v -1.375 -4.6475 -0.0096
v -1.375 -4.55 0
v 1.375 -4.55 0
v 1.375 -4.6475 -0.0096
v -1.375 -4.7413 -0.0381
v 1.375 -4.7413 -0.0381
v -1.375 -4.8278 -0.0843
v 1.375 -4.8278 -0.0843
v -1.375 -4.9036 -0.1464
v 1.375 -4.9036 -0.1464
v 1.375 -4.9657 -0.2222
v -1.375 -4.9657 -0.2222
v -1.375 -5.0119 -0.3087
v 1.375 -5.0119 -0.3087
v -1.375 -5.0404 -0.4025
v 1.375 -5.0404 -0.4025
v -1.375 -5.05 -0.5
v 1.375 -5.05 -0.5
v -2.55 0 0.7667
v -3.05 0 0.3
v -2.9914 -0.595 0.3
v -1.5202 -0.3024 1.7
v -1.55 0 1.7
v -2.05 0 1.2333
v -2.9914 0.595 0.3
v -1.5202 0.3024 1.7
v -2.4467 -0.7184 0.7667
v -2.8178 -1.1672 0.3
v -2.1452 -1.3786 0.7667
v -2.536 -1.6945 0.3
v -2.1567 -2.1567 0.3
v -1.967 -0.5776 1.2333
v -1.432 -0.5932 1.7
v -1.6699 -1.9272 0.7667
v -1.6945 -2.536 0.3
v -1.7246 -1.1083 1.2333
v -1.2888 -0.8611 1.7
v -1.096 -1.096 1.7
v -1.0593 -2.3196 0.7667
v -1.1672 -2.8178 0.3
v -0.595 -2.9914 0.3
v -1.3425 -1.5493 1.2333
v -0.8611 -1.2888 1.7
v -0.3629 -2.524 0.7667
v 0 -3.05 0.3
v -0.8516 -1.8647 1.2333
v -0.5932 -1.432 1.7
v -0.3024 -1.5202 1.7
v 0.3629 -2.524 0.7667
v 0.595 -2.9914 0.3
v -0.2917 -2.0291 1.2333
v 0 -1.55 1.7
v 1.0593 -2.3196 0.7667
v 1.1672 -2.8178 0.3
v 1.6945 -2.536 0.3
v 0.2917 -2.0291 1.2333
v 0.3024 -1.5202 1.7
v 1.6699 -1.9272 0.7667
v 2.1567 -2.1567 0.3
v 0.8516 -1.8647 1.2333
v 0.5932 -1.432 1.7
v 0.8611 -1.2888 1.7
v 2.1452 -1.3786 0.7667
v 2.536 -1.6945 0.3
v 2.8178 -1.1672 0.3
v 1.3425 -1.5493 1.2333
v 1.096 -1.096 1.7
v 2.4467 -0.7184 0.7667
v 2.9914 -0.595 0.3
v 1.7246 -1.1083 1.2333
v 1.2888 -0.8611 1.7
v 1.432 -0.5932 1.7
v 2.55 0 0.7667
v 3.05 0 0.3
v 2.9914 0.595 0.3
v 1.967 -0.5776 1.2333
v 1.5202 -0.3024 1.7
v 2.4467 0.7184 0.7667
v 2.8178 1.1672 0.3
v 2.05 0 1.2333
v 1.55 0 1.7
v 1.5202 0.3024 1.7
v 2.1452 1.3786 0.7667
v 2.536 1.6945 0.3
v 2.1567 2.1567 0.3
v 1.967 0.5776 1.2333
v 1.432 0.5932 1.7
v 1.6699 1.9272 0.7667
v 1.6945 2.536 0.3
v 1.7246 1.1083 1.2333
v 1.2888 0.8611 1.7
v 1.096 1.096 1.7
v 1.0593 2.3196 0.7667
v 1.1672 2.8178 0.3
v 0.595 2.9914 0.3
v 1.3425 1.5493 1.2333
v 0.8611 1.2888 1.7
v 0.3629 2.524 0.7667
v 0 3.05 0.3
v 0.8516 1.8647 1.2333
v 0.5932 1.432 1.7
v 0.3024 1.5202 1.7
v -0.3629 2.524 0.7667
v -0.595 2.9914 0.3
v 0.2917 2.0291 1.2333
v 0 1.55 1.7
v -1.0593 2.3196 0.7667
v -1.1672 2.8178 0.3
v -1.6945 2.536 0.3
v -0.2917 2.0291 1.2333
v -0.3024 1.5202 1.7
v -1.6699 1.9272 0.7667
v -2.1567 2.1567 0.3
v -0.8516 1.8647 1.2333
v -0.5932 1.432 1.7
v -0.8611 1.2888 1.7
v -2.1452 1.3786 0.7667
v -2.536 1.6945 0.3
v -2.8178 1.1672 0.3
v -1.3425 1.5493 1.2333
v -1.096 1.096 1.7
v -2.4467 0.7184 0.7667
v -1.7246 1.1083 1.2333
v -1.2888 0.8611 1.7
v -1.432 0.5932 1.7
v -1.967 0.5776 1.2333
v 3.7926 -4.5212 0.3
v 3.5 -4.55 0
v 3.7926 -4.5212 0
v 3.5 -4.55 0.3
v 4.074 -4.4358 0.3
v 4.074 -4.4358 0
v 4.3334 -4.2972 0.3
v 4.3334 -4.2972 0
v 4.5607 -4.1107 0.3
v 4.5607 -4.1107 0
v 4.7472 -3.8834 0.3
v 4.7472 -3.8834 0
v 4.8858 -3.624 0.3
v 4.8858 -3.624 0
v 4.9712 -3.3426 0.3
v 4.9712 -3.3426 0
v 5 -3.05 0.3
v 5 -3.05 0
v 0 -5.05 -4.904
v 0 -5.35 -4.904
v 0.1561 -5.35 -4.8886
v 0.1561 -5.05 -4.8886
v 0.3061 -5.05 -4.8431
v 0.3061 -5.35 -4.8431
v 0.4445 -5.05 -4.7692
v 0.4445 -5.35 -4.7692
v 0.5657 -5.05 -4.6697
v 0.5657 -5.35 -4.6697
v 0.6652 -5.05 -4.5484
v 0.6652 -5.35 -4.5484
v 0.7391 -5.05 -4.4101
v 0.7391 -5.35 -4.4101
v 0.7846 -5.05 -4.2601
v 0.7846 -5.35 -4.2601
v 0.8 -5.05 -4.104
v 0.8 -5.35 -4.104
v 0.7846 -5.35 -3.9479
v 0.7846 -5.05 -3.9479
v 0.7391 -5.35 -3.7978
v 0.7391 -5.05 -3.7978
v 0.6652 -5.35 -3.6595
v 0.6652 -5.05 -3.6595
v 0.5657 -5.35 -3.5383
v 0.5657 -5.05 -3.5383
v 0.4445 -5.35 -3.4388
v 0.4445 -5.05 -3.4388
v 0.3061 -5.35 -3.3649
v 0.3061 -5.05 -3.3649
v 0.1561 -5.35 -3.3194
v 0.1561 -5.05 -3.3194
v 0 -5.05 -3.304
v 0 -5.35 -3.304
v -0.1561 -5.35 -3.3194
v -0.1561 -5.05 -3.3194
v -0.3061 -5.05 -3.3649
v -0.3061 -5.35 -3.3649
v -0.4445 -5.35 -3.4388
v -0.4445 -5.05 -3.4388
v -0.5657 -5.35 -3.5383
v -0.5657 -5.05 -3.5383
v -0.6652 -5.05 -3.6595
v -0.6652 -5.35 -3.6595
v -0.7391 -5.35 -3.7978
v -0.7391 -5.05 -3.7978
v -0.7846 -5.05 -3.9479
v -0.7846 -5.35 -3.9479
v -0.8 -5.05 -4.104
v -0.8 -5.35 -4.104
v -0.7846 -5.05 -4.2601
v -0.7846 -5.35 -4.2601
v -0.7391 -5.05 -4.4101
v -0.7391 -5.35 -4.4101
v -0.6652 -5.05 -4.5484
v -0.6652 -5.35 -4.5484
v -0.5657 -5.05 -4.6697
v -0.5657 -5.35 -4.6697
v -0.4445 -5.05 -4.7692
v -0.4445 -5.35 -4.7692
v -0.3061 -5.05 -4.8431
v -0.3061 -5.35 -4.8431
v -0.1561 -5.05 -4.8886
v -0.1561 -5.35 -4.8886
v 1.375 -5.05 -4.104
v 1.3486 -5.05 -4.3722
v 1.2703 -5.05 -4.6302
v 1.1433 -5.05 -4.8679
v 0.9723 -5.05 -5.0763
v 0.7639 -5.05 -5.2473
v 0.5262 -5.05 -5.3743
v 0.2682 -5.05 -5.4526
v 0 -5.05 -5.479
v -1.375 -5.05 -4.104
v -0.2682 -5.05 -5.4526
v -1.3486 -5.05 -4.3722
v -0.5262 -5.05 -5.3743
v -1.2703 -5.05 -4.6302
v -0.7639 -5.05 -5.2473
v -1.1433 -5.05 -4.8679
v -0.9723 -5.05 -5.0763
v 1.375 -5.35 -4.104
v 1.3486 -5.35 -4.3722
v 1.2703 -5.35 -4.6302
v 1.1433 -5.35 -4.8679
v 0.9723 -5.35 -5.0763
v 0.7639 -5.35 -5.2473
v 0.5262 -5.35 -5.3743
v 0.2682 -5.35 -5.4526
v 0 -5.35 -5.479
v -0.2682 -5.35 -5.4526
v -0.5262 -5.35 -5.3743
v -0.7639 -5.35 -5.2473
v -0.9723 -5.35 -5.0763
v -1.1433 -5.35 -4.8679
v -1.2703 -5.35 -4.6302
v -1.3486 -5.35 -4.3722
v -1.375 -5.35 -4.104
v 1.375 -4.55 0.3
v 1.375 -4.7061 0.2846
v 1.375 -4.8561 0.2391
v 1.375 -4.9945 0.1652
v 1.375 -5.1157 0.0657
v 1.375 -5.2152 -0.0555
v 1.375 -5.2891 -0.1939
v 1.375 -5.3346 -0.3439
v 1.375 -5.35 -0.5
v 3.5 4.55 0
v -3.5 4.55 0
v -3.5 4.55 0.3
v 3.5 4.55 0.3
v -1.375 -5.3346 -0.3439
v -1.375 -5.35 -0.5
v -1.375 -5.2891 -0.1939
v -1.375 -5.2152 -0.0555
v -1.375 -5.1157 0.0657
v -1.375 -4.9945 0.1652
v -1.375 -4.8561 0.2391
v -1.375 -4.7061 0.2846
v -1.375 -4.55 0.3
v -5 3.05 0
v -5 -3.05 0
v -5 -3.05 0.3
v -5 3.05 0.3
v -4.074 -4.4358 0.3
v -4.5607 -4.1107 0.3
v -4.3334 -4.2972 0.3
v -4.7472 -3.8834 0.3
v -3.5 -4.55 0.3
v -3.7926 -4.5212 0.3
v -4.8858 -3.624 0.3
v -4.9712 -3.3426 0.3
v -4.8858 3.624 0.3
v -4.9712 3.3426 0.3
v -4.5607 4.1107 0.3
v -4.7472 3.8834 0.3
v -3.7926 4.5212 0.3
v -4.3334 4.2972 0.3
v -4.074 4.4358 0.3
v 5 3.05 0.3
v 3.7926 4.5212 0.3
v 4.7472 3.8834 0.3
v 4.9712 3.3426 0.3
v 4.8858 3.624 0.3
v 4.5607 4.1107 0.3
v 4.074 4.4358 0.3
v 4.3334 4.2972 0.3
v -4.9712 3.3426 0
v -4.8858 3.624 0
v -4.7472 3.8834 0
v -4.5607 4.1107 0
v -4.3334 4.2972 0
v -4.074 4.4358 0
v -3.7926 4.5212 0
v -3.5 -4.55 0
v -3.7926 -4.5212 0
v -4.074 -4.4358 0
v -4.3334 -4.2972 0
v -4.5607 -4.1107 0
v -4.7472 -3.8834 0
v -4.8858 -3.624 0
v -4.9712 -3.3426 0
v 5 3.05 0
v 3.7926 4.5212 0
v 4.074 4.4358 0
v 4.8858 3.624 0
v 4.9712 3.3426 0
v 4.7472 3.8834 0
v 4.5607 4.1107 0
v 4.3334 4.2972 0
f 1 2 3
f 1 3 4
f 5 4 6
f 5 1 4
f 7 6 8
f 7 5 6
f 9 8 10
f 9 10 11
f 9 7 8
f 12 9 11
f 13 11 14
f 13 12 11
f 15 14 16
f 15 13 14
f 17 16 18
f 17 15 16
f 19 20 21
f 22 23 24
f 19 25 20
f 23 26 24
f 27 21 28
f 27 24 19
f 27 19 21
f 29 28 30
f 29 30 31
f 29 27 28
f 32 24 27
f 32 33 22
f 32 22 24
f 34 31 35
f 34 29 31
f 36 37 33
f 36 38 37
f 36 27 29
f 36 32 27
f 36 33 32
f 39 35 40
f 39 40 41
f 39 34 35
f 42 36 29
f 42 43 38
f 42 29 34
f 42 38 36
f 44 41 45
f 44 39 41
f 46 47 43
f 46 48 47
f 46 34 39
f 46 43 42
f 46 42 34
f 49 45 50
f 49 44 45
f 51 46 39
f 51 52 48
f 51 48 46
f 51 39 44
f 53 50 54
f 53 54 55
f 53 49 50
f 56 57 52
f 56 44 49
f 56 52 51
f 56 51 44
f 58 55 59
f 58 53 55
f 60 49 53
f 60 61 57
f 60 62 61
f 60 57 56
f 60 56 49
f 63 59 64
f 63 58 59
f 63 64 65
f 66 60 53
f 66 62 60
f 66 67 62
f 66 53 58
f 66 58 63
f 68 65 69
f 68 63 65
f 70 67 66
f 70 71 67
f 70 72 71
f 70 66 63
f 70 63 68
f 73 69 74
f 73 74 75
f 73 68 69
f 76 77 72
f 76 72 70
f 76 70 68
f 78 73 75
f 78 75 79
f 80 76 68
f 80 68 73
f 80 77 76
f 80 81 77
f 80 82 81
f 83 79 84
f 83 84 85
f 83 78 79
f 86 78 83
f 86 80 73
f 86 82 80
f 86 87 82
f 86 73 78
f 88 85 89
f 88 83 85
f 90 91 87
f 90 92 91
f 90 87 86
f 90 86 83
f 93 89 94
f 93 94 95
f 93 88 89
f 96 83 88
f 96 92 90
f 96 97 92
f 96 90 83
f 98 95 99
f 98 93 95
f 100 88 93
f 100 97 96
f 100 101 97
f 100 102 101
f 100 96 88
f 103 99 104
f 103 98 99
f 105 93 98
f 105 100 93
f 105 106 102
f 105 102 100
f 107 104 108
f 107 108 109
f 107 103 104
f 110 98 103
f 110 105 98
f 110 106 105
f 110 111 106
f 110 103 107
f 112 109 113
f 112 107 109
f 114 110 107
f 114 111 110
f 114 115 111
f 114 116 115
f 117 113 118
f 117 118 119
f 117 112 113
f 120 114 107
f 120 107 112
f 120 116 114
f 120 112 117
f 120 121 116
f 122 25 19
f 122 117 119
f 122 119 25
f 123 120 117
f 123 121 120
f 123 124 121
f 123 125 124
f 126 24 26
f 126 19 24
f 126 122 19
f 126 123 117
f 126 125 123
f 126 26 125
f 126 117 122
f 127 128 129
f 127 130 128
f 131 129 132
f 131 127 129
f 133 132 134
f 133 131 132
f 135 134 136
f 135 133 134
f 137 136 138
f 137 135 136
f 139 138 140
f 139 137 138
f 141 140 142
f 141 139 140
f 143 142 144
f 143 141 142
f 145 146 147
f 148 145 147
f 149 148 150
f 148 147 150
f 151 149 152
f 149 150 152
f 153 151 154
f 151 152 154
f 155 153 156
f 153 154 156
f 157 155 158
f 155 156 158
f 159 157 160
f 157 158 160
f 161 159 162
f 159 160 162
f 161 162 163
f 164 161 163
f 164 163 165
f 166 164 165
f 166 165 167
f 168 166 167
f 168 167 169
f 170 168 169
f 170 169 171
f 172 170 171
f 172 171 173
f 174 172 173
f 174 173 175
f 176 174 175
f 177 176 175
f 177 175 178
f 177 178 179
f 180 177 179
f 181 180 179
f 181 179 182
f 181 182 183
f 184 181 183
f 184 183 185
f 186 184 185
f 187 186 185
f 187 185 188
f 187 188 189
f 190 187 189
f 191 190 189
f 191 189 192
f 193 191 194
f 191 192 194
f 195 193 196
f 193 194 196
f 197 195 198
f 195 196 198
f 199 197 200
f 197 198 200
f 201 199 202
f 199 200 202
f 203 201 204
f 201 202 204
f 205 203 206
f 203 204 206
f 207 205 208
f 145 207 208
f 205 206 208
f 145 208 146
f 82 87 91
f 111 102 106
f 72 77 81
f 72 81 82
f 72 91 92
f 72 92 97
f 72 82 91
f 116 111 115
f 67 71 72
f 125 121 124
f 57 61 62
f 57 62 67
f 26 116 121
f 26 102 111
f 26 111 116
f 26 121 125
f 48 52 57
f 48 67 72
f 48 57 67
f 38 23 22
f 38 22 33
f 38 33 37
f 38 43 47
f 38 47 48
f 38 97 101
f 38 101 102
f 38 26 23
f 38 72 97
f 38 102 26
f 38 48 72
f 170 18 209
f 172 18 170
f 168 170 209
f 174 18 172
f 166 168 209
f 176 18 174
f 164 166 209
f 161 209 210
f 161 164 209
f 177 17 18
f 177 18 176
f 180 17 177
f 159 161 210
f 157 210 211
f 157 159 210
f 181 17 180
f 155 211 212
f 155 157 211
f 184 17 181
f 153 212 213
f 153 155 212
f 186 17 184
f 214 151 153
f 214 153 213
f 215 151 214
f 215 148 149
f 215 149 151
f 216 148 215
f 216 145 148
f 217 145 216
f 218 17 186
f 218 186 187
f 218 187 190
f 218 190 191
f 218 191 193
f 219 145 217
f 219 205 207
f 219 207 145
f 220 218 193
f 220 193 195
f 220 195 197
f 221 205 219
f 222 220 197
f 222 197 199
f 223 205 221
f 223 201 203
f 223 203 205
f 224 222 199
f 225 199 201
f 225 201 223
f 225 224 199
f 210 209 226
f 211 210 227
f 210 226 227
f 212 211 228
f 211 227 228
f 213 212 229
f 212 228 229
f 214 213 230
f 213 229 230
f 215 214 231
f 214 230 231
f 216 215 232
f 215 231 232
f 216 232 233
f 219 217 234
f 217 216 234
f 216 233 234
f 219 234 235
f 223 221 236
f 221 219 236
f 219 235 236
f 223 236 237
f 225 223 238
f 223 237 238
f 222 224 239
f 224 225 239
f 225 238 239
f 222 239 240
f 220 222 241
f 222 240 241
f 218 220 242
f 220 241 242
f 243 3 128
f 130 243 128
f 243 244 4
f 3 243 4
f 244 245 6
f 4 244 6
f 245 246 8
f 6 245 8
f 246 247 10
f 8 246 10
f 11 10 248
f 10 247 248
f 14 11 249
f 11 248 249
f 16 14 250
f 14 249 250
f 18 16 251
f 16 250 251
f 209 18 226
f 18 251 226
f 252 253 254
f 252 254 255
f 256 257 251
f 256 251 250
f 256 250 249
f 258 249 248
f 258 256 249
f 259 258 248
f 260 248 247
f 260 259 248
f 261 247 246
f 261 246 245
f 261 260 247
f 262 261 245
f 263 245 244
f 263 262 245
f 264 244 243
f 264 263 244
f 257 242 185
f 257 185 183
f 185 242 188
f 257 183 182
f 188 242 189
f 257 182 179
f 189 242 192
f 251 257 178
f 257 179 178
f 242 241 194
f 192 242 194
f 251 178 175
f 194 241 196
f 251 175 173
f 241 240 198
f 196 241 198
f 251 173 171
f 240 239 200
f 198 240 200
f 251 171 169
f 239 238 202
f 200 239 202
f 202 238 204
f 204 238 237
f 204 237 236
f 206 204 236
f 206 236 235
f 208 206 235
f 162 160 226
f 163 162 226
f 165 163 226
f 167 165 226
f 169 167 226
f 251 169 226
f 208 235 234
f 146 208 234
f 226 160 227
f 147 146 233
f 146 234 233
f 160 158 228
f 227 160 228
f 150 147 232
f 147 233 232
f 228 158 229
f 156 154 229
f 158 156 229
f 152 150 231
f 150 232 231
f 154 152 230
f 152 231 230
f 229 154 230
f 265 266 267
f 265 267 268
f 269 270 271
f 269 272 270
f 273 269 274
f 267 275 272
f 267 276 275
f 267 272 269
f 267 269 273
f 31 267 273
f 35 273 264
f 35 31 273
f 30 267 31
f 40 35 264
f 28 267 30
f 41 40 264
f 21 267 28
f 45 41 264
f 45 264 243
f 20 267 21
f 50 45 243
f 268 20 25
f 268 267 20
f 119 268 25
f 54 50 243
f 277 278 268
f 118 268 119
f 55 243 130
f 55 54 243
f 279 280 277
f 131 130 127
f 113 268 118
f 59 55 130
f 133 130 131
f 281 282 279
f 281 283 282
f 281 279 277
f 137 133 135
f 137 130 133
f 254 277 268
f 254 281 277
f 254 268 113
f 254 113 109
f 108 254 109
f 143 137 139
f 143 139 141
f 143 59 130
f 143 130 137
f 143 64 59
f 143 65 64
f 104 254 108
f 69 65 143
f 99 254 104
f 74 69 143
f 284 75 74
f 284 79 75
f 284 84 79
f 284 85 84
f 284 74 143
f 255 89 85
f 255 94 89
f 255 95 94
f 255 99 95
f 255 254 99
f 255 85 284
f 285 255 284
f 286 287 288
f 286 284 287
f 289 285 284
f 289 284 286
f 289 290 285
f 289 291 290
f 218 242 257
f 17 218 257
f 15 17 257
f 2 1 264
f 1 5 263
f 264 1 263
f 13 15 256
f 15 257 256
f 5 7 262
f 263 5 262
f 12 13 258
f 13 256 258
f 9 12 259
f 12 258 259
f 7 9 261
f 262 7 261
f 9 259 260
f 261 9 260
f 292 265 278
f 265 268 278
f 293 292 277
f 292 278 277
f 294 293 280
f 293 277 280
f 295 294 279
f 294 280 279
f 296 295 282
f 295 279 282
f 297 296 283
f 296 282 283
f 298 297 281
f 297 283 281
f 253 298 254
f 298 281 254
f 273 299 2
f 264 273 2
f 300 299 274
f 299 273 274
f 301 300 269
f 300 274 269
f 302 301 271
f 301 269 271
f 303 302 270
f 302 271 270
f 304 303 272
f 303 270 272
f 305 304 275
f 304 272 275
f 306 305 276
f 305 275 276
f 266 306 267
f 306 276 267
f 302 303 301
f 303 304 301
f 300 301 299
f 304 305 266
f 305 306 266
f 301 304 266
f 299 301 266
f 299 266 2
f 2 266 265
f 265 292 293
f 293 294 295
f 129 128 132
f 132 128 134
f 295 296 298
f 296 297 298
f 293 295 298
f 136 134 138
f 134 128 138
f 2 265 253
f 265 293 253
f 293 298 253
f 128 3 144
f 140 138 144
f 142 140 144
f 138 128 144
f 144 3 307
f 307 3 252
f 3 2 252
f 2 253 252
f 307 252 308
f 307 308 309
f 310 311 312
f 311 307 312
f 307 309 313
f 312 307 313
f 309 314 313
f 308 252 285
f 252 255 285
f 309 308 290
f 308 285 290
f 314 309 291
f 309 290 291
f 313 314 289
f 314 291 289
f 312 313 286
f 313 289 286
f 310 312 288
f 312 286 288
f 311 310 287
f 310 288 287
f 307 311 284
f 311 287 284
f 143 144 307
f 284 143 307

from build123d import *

# Parameters (mm, degrees)
SKETCH1_W                  = 10
SKETCH1_H                  = 9.1
BASE_FLANGE1_DEPTH         = 0.3
TAB1_DEPTH                 = 0.3
SKETCHED_START             = -12
SKETCHED_BEND1_OUTLINE_W   = 2.75
SKETCHED_BEND1_OUTLINE_H   = 0.3
SKETCHED_BEND1_DEPTH       = 6.725504
SKETCHED_START_2           = -5.274496
SKETCHED_BEND1_2_OUTLINE_W = 2.75
SKETCHED_BEND1_2_OUTLINE_H = 0.3
SKETCHED_BEND1_2_DEPTH     = 0.074434719
SKETCHED_START_3           = -5.35
SKETCHED_BEND1_3_DEPTH     = 0.8
SKETCHED_START_4           = -1.375
SKETCHED_BEND1_4_DEPTH     = 2.75
FILLET1_R                  = 1.5
SKETCH13_R                 = 0.8
CUT_EXTRUDE2_DEPTH         = 13.370499101


with BuildPart() as part:
    # Base-Flange1: sheet metal written as solids
    # Sketch1 → Base-Flange1 (new body)
    with BuildSketch(Plane.XY):
        Rectangle(SKETCH1_W, SKETCH1_H)
    extrude(amount=BASE_FLANGE1_DEPTH)

    # Tab1: sheet metal written as solids
    # Sketch7 → Tab1 (add)
    with BuildSketch(Plane.XY):
        with BuildLine():
            Line((1.375, 0), (1.375, -9.175))
            ThreePointArc((1.375, -9.175), (0, -10.55), (-1.375, -9.175))
            Line((-1.375, -9.175), (-1.375, 0))
            ThreePointArc((-1.375, 0), (0, 1.375), (1.375, 0))
        make_face()
    extrude(amount=TAB1_DEPTH)

    # Sketched Bend1: read off the stored shape, not the designer's step
    # Sketched Bend1 outline → Sketched Bend1 (cut)
    with BuildSketch(Plane(origin=(0, 0, 0), x_dir=(1, 0, 0), z_dir=(0, 1, 0)).offset(SKETCHED_START)):
        with Locations((0, -0.15)):
            Rectangle(SKETCHED_BEND1_OUTLINE_W, SKETCHED_BEND1_OUTLINE_H)
    extrude(amount=SKETCHED_BEND1_DEPTH, mode=Mode.SUBTRACT)

    # Sketched Bend1 2 outline → Sketched Bend1 2 (cut)
    with BuildSketch(Plane(origin=(0, 0, 0), x_dir=(1, 0, 0), z_dir=(0, 1, 0)).offset(SKETCHED_START_2)):
        with Locations((0, -0.15)):
            Rectangle(SKETCHED_BEND1_2_OUTLINE_W, SKETCHED_BEND1_2_OUTLINE_H)
    extrude(amount=SKETCHED_BEND1_2_DEPTH, mode=Mode.SUBTRACT)

    # Sketched Bend1 3 outline → Sketched Bend1 3 (add)
    with BuildSketch(Plane(origin=(0, 0, 0), x_dir=(1, 0, 0), z_dir=(0, 1, 0)).offset(SKETCHED_START_3)):
        with BuildLine():
            Line((-1.375, 4.103982388), (-1.375, 0))
            Line((-1.375, 0), (1.375, 0))
            Line((1.375, 0), (1.375, 4.103982388))
            ThreePointArc((1.375, 4.103982388), (0, 5.478982388), (-1.375, 4.103982388))
        make_face()
    extrude(amount=SKETCHED_BEND1_3_DEPTH)

    # Sketched Bend1 4 outline → Sketched Bend1 4 (cut)
    with BuildSketch(Plane.YZ.offset(SKETCHED_START_4)):
        with BuildLine():
            Line((-5.05, -0.5), (-5.05, -7))
            Line((-5.05, -7), (-4.55, -7))
            Line((-4.55, -7), (-4.55, 0))
            ThreePointArc((-4.55, 0), (-4.903553391, -0.146446609), (-5.05, -0.5))
        make_face()
        with BuildLine():
            Line((-7, -7), (-5.349999999, -7))
            Line((-5.349999999, -7), (-5.35, -0.5))
            ThreePointArc((-5.35, -0.5), (-5.115685425, 0.065685425), (-4.55, 0.3))
            Line((-4.55, 0.3), (-3, 0.3))
            Line((-3, 0.3), (-3, 2))
            Line((-3, 2), (-5.200061281, 2))
            Line((-5.200061281, 2), (-5.200061281, 0))
            Line((-5.200061281, 0), (-7, 0))
            Line((-7, 0), (-7, -7))
        make_face()
    extrude(amount=SKETCHED_BEND1_4_DEPTH, mode=Mode.SUBTRACT)

    # Fillet1
    fillet1_edges = [part.edges().sort_by_distance(p)[0] for p in [
        (-5, 4.55, 0.15),
        (5, 4.55, 0.15),
        (5, -4.55, 0.15),
        (-5, -4.55, 0.15),
    ]]
    fillet(fillet1_edges, radius=FILLET1_R)

    # Sketch13 → Cut-Extrude2 (cut, through all)
    with BuildSketch(Plane.XZ.offset(5.35)):
        with Locations(Location((0, -4.103982388, 0), (0, 0, 270))):
            Circle(SKETCH13_R)
    extrude(amount=-CUT_EXTRUDE2_DEPTH, mode=Mode.SUBTRACT)

    # Sketch14 → Revolve1 (revolve)
    with BuildSketch(Plane(origin=(0, 0, 0), x_dir=(1, 0, 0), z_dir=(0, 1, 0)), mode=Mode.PRIVATE) as revolve1_sk:
        Polygon((0, -0.3), (3.05, -0.3), (1.55, -1.7), (0, -1.7), align=None)
    revolve(revolve1_sk.sketch.rotate(Axis((0, 0, -88.99), (0, 0, 1)), 180), axis=Axis((0, 0, -88.99), (0, 0, 1)))


solid = part.part
